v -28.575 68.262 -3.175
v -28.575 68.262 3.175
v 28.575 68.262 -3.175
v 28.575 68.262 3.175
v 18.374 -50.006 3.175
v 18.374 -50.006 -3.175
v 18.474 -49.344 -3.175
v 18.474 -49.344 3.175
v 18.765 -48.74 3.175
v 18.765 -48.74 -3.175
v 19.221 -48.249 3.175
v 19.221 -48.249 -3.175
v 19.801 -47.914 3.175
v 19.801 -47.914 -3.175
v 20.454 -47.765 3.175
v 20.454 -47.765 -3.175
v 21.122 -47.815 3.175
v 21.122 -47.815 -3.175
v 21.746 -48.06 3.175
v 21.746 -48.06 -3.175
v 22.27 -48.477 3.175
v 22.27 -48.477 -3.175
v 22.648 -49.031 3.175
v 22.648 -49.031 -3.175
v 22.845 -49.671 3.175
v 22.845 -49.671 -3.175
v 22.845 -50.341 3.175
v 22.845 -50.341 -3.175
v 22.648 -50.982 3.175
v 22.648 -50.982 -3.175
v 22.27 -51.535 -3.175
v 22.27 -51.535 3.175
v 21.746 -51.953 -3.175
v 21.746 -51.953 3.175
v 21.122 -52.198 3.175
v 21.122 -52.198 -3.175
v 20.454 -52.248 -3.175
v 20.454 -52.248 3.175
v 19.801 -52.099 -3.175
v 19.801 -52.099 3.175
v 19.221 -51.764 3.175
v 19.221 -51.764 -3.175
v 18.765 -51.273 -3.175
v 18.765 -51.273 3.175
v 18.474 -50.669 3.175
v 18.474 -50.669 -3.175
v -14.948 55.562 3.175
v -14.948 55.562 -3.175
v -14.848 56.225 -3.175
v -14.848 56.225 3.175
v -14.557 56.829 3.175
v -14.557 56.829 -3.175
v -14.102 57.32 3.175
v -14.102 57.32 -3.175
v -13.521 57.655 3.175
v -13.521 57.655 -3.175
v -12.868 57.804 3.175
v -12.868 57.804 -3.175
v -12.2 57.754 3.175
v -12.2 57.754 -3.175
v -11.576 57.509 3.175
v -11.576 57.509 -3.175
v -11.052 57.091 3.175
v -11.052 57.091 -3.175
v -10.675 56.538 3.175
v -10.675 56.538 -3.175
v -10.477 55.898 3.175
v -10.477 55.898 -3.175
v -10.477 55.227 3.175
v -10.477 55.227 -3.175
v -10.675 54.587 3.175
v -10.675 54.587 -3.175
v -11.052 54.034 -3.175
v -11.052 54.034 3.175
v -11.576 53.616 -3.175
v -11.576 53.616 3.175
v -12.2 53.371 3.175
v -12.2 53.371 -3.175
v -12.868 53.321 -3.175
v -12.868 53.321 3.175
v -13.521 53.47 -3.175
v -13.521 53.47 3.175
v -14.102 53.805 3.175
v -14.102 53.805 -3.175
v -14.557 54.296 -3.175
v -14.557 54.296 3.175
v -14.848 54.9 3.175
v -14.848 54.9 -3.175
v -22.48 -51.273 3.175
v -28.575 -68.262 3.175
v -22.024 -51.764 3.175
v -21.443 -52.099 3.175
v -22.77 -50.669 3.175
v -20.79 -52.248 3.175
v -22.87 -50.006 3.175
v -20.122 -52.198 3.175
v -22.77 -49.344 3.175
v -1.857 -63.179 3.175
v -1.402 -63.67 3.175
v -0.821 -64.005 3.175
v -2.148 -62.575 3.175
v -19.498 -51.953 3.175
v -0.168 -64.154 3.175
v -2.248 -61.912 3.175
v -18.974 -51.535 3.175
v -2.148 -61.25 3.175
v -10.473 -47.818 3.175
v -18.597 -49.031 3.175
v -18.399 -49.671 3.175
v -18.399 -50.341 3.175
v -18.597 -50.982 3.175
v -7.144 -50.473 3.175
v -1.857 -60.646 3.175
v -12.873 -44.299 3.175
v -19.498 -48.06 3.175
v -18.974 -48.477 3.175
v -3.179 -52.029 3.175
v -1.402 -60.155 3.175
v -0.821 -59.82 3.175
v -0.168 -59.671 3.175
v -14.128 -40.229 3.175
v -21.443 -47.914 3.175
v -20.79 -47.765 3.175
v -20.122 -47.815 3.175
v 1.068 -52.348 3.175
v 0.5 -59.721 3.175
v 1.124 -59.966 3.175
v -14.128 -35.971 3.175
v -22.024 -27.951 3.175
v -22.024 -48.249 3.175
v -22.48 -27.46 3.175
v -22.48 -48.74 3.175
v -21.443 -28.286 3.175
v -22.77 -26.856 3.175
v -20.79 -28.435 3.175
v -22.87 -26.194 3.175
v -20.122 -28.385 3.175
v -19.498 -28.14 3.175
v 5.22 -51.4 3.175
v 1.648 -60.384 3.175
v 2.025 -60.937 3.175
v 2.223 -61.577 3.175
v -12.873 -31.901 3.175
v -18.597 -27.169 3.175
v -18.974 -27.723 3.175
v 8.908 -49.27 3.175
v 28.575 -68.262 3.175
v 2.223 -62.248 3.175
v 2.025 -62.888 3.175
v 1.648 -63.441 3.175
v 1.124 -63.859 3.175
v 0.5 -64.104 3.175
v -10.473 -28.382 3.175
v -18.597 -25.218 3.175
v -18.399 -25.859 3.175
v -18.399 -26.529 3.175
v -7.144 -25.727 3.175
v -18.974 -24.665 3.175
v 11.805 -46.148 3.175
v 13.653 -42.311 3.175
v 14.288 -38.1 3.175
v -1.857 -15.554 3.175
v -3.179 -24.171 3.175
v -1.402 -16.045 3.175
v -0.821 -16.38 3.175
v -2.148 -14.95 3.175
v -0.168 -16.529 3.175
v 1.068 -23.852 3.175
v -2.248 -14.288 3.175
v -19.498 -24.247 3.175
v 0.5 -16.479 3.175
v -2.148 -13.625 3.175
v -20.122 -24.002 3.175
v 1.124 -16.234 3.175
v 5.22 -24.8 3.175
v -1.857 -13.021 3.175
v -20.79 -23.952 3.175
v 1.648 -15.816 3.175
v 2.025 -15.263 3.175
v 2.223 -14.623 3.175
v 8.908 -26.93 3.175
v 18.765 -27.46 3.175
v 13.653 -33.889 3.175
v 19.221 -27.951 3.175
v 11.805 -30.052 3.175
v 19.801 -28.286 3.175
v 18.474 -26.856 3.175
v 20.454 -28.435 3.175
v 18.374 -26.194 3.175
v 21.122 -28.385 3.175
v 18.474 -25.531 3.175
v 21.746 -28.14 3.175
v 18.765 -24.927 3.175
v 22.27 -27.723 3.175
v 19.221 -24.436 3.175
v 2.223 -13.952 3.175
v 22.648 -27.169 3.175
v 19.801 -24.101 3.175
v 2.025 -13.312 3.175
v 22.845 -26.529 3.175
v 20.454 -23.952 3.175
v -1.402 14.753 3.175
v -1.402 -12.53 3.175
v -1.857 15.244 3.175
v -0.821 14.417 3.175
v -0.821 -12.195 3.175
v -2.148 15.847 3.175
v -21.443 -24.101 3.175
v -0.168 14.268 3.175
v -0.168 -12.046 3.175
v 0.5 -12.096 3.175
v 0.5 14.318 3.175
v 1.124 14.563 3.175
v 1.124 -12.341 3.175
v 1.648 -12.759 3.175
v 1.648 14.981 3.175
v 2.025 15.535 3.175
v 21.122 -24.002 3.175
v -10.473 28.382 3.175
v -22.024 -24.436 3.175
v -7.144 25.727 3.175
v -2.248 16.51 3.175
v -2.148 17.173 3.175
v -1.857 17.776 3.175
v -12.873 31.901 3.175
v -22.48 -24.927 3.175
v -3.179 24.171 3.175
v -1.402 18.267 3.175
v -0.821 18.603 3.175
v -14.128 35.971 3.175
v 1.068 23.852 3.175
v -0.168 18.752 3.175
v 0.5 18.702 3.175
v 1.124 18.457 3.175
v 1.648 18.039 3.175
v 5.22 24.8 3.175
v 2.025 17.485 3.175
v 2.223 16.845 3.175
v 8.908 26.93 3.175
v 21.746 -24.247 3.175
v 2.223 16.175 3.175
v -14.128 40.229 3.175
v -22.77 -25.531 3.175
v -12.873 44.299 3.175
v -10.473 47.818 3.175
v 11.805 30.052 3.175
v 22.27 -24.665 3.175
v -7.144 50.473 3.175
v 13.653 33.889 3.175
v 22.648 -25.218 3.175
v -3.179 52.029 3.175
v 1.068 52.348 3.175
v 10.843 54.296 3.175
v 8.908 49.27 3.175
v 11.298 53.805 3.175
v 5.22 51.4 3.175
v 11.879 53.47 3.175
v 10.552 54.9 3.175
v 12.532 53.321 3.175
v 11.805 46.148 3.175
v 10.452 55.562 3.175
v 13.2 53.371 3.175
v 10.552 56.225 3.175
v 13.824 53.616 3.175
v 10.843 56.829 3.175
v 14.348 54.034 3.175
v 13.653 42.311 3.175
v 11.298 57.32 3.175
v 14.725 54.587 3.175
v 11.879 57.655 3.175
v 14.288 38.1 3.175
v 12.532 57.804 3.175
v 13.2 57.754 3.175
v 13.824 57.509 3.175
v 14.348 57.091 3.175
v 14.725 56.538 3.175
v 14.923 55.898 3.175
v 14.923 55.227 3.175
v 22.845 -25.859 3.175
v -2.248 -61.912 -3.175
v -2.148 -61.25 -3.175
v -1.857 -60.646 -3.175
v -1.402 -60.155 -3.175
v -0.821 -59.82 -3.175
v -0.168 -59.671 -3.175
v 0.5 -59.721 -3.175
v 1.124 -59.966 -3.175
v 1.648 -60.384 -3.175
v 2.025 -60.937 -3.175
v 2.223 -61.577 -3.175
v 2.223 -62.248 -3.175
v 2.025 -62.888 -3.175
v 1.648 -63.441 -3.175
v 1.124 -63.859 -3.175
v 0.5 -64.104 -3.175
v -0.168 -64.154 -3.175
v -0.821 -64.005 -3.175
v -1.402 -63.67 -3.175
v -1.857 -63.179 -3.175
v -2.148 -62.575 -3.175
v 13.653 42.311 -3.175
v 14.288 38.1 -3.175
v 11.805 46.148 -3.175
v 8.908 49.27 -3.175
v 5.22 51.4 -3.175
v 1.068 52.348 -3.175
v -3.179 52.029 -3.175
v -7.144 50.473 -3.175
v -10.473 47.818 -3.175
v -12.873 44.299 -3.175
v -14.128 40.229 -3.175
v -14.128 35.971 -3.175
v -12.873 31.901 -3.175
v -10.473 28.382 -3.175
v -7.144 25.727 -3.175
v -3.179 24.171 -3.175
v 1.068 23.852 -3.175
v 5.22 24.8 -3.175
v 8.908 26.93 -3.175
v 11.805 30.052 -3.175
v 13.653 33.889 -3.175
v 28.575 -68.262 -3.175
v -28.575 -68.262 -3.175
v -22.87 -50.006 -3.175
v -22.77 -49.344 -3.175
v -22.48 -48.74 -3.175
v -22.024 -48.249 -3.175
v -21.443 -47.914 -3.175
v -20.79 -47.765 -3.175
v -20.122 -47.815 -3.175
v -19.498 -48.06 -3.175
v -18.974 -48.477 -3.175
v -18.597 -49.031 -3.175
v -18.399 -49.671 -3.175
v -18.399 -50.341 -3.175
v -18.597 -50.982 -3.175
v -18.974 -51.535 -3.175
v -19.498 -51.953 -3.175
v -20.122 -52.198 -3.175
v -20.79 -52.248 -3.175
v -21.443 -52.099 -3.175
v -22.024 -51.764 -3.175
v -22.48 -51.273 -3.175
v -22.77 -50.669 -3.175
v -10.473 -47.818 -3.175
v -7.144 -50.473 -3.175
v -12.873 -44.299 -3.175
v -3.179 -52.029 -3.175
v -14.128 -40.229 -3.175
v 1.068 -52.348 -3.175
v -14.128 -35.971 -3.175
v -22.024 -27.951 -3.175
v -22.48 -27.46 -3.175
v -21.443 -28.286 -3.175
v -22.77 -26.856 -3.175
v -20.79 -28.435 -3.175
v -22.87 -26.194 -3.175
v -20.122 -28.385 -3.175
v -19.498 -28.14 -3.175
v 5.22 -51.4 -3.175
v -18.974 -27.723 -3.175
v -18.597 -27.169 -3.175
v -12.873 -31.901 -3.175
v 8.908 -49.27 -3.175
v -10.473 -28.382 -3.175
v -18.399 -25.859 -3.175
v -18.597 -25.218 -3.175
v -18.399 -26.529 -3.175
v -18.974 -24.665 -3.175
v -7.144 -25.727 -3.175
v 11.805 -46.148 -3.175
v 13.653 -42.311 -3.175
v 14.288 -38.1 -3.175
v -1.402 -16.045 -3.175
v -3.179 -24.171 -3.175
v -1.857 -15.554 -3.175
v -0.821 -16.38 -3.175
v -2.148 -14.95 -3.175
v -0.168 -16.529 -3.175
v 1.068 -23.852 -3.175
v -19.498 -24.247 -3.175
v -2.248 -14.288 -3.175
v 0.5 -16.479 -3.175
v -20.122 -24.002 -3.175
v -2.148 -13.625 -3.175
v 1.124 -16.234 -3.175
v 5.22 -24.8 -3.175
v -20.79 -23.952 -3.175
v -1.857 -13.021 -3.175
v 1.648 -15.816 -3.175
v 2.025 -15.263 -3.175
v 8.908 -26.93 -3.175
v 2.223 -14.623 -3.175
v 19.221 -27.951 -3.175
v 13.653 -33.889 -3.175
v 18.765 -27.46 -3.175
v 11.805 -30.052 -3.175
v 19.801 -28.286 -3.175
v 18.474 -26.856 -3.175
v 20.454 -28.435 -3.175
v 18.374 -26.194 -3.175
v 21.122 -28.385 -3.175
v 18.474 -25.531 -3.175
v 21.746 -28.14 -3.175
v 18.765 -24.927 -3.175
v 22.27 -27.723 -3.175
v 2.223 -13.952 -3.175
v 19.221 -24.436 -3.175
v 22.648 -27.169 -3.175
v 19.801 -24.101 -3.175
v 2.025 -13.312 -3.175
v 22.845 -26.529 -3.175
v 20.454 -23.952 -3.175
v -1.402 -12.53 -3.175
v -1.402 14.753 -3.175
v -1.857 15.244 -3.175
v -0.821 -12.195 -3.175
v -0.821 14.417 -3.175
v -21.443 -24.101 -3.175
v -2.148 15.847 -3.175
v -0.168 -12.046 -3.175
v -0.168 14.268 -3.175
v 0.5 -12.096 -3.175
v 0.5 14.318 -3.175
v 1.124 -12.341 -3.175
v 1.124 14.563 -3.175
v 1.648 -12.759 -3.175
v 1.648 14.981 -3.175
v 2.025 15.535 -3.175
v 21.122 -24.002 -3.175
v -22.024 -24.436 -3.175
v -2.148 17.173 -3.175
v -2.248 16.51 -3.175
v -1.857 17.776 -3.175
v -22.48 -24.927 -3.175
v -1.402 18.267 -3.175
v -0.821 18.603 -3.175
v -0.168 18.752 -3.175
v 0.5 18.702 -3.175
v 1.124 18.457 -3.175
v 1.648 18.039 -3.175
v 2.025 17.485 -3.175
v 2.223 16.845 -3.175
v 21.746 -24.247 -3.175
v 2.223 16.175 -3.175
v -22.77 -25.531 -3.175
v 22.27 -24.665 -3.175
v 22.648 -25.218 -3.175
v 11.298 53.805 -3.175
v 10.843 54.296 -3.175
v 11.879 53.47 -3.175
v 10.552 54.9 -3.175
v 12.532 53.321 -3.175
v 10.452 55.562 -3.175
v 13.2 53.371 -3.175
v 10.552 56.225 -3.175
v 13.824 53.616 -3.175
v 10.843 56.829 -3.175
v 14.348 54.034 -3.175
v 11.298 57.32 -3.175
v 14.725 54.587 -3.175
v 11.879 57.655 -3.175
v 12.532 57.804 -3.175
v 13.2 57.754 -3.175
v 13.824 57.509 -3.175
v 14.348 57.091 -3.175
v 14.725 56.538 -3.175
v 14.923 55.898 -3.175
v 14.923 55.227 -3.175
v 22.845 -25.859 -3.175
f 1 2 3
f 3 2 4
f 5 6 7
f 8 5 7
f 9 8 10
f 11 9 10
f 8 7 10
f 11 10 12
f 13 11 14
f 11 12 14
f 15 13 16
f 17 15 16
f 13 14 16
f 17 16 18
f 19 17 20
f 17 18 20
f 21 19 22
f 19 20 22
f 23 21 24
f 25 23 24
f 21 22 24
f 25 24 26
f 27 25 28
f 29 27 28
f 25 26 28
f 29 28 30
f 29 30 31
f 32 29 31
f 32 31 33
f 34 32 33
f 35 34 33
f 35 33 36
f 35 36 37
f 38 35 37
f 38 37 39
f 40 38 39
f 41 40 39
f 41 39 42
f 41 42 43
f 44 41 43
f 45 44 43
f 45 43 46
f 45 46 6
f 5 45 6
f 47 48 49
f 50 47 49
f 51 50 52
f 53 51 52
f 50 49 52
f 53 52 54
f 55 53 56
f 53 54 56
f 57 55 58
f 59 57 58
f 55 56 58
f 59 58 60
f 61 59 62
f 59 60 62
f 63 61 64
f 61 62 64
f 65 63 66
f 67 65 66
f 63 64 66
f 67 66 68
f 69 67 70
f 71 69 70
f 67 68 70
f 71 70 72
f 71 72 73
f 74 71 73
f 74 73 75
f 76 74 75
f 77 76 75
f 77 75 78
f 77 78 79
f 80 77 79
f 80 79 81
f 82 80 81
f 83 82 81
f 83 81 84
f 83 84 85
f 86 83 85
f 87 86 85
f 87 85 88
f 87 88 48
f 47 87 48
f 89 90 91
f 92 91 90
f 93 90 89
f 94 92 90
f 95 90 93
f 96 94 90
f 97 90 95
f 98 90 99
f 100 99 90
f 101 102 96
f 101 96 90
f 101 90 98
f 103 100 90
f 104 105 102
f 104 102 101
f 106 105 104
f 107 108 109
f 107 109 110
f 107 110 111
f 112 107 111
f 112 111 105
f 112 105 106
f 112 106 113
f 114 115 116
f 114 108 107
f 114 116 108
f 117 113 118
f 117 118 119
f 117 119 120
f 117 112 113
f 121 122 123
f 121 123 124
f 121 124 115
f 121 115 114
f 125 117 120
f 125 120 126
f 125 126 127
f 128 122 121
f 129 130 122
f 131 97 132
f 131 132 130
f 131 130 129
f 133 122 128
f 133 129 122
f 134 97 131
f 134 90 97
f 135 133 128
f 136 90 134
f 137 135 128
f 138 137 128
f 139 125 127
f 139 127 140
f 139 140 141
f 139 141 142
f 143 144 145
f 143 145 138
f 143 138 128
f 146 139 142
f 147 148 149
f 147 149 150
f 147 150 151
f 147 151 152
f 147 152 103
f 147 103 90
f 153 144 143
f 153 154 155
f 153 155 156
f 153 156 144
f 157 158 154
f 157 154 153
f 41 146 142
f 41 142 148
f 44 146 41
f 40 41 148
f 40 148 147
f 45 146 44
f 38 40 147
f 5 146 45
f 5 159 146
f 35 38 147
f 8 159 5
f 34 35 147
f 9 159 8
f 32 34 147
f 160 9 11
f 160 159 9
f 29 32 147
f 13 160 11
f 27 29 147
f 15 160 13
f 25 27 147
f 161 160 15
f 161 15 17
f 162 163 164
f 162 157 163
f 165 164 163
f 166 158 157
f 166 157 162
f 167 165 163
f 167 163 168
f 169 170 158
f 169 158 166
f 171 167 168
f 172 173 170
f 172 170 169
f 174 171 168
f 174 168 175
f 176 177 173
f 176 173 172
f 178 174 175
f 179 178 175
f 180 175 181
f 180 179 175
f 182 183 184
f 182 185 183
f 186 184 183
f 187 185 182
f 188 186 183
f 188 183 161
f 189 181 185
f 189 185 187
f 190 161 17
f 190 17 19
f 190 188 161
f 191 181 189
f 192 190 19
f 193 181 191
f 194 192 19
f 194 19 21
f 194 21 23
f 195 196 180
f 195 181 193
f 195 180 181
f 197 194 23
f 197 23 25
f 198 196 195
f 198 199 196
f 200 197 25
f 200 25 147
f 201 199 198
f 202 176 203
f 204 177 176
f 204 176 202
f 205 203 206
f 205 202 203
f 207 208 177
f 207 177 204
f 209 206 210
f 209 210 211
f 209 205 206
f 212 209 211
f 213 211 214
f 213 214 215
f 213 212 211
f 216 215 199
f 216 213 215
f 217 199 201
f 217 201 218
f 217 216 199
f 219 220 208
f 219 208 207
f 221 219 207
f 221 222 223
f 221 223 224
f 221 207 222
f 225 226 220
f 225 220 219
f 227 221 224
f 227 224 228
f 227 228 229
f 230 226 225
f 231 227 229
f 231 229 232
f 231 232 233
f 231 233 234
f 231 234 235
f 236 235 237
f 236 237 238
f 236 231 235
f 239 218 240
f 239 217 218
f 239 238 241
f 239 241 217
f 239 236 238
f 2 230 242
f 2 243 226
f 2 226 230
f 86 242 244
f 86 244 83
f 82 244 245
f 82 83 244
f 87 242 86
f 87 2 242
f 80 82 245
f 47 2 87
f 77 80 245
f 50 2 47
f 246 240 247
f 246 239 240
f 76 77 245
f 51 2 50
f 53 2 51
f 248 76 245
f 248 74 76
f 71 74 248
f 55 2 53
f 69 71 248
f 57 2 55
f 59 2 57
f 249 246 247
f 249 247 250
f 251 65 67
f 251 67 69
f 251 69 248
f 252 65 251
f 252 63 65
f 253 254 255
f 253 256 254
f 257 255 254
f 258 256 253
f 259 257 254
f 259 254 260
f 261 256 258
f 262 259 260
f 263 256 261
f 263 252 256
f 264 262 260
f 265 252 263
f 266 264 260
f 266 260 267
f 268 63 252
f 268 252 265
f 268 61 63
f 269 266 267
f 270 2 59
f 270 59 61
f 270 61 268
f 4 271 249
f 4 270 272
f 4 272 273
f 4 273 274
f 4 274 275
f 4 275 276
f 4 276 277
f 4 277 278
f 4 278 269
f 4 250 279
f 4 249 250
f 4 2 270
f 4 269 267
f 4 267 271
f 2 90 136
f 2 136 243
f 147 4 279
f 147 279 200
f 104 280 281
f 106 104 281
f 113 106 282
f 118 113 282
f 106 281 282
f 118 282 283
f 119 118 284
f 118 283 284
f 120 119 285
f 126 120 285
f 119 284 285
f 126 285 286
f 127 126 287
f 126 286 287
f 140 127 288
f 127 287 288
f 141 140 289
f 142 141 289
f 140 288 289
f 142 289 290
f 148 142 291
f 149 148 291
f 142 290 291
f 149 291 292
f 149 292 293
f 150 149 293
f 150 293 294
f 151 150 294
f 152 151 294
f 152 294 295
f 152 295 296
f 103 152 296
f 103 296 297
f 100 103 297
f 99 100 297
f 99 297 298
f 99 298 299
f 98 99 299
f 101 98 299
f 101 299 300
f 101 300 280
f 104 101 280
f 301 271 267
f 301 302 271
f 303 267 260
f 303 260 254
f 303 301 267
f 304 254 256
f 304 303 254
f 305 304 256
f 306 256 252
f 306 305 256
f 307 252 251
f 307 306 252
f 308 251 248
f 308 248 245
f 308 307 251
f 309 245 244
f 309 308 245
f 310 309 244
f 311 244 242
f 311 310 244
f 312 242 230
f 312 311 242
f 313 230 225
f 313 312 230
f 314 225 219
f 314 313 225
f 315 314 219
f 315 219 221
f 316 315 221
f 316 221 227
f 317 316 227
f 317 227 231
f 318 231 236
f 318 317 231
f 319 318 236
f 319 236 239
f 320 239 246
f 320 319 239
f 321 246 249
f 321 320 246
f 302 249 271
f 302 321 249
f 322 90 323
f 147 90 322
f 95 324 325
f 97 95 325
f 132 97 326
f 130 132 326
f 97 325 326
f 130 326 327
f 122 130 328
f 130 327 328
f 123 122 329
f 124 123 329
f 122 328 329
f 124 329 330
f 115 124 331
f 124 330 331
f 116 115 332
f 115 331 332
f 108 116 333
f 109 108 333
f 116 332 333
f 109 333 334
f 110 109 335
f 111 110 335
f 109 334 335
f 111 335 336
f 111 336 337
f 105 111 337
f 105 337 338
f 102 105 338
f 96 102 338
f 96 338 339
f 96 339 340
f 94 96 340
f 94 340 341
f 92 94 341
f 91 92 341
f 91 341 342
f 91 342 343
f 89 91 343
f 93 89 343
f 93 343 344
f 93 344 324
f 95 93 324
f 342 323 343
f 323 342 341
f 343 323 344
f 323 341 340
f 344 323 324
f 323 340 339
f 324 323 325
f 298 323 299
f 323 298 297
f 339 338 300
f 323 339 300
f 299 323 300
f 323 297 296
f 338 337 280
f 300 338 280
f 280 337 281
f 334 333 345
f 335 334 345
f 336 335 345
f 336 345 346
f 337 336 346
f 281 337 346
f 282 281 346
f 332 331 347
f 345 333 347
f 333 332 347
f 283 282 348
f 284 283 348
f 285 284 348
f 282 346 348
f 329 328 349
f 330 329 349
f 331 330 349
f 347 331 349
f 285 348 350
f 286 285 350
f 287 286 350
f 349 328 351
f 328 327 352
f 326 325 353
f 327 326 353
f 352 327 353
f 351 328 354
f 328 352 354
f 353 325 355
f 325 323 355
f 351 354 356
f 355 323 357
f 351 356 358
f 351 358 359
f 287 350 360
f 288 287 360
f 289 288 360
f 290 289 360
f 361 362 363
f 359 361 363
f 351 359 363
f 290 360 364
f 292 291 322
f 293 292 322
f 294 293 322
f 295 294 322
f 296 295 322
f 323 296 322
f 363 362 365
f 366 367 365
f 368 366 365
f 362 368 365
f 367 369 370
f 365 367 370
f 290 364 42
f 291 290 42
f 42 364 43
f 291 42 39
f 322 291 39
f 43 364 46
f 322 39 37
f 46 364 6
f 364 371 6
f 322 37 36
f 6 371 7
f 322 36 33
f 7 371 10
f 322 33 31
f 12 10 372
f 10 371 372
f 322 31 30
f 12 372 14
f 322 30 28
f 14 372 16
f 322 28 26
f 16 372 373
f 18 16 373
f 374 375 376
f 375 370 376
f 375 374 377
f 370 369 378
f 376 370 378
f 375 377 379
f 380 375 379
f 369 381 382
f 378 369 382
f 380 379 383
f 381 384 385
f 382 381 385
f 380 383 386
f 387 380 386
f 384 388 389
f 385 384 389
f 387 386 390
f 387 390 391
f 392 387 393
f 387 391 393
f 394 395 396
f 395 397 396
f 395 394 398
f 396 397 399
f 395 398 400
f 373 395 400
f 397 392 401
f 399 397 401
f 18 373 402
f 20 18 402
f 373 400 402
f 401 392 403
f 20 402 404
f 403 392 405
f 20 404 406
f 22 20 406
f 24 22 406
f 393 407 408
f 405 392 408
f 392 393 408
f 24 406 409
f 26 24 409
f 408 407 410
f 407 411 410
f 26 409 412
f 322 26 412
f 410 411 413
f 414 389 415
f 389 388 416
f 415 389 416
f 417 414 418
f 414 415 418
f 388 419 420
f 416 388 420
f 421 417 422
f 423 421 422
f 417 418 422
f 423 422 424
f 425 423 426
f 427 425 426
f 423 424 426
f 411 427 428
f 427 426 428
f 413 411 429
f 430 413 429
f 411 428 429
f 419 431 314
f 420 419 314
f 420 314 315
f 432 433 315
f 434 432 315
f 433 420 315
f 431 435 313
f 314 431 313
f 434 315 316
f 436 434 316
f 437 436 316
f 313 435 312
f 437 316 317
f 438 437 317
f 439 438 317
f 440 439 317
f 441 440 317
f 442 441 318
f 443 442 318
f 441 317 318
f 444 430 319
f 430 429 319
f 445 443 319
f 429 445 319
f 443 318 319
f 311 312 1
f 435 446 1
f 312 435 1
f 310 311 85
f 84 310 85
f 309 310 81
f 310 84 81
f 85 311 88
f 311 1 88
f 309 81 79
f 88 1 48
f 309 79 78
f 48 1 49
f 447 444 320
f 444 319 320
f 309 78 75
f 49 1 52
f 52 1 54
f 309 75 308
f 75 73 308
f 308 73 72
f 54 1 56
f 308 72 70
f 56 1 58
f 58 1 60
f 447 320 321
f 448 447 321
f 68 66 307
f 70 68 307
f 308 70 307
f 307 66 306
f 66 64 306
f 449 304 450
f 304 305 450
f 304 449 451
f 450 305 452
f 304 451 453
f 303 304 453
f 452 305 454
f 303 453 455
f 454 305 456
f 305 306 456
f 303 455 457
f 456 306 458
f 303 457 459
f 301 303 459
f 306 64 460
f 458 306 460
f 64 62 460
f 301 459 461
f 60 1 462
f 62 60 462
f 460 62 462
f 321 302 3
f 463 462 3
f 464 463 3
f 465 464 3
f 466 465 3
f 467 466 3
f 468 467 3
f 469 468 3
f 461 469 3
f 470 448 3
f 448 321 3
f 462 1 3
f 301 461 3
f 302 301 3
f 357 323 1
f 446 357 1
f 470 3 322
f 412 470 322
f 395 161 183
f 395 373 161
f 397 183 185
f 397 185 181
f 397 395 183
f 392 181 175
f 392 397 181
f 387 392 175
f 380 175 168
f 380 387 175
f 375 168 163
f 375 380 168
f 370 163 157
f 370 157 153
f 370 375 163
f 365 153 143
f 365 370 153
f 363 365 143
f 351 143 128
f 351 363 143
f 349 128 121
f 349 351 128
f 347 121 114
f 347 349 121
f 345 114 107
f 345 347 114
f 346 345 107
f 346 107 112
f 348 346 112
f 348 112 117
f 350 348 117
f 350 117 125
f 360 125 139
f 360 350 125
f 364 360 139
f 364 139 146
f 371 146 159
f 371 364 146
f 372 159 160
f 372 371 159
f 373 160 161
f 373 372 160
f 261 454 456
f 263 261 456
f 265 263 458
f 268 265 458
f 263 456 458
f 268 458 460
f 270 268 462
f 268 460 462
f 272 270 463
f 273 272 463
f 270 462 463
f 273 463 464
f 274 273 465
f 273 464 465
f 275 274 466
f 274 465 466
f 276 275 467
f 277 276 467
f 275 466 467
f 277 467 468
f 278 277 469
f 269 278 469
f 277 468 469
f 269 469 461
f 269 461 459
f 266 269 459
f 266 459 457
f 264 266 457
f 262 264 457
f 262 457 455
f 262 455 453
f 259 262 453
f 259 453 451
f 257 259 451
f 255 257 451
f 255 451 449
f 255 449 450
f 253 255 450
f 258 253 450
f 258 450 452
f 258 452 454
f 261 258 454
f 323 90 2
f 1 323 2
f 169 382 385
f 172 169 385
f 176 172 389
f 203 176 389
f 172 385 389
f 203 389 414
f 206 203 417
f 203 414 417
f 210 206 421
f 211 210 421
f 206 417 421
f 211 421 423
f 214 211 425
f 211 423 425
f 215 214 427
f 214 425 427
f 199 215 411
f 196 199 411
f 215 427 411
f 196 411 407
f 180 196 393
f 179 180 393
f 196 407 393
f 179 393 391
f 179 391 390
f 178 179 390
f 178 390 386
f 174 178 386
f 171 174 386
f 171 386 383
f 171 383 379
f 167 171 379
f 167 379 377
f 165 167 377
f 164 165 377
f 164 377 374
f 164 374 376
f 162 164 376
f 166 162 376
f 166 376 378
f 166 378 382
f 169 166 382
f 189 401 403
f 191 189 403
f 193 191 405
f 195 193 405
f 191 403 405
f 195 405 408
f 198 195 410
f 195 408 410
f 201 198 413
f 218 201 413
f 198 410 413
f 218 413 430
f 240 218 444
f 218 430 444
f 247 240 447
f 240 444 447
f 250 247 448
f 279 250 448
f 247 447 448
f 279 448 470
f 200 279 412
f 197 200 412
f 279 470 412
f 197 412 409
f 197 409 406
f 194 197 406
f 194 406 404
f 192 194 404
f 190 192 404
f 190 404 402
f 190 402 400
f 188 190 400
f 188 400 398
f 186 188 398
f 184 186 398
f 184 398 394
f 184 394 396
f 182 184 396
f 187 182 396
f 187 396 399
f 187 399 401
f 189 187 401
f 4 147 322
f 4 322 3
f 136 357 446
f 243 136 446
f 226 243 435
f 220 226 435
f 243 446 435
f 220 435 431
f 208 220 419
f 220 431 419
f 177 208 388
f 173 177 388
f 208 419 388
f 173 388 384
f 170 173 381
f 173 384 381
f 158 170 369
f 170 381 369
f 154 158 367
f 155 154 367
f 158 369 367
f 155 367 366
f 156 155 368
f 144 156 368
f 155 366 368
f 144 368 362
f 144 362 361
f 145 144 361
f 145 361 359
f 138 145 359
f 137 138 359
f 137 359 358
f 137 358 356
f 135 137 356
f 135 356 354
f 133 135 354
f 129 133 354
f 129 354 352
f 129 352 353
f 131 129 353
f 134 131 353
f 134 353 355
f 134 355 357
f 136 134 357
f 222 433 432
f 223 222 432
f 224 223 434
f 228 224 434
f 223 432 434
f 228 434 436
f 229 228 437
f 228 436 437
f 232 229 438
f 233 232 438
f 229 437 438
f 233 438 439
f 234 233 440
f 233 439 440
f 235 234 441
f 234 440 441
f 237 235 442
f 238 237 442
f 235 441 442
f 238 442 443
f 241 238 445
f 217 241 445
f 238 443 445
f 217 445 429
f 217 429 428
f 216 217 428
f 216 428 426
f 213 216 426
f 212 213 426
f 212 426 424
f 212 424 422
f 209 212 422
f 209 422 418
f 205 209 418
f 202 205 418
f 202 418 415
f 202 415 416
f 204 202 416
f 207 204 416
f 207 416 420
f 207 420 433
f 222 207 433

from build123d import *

# Parameters (mm, degrees)
SKETCH1_W             = 57.15
SKETCH1_H             = 136.525
SKETCH1_R             = 14.2875
BOSS_EXTRUDE1_DEPTH   = 3.175
F_8_CLEARANCE_HOLE1_D = 4.4958
F_8_CLEARANCE_HOLE2_D = 4.4958


with BuildPart() as part:
    # Sketch1 → Boss-Extrude1 (new, symmetric)
    with BuildSketch(Plane.XY):
        Rectangle(SKETCH1_W, SKETCH1_H)
        with Locations((0, 38.1)):
            Circle(SKETCH1_R, mode=Mode.SUBTRACT)
        with Locations((0, -38.1)):
            Circle(SKETCH1_R, mode=Mode.SUBTRACT)
    extrude(amount=BOSS_EXTRUDE1_DEPTH, both=True)

    # #8 Clearance Hole1 (through all)
    with Locations(Plane.XY.offset(3.175)):
        with Locations((0, -14.2875), (20.622229928, -26.19375), (20.622229928, -50.00625), (0, -61.9125), (-20.622229928, -50.00625), (-20.622229928, -26.19375), (0, -38.1)):
            Hole(F_8_CLEARANCE_HOLE1_D / 2)

    # #8 Clearance Hole2 (through all)
    with Locations(Plane.XY.offset(3.175)):
        with Locations((-12.7, 55.5625), (12.7, 55.5625), (0, 16.51)):
            Hole(F_8_CLEARANCE_HOLE2_D / 2)


solid = part.part
